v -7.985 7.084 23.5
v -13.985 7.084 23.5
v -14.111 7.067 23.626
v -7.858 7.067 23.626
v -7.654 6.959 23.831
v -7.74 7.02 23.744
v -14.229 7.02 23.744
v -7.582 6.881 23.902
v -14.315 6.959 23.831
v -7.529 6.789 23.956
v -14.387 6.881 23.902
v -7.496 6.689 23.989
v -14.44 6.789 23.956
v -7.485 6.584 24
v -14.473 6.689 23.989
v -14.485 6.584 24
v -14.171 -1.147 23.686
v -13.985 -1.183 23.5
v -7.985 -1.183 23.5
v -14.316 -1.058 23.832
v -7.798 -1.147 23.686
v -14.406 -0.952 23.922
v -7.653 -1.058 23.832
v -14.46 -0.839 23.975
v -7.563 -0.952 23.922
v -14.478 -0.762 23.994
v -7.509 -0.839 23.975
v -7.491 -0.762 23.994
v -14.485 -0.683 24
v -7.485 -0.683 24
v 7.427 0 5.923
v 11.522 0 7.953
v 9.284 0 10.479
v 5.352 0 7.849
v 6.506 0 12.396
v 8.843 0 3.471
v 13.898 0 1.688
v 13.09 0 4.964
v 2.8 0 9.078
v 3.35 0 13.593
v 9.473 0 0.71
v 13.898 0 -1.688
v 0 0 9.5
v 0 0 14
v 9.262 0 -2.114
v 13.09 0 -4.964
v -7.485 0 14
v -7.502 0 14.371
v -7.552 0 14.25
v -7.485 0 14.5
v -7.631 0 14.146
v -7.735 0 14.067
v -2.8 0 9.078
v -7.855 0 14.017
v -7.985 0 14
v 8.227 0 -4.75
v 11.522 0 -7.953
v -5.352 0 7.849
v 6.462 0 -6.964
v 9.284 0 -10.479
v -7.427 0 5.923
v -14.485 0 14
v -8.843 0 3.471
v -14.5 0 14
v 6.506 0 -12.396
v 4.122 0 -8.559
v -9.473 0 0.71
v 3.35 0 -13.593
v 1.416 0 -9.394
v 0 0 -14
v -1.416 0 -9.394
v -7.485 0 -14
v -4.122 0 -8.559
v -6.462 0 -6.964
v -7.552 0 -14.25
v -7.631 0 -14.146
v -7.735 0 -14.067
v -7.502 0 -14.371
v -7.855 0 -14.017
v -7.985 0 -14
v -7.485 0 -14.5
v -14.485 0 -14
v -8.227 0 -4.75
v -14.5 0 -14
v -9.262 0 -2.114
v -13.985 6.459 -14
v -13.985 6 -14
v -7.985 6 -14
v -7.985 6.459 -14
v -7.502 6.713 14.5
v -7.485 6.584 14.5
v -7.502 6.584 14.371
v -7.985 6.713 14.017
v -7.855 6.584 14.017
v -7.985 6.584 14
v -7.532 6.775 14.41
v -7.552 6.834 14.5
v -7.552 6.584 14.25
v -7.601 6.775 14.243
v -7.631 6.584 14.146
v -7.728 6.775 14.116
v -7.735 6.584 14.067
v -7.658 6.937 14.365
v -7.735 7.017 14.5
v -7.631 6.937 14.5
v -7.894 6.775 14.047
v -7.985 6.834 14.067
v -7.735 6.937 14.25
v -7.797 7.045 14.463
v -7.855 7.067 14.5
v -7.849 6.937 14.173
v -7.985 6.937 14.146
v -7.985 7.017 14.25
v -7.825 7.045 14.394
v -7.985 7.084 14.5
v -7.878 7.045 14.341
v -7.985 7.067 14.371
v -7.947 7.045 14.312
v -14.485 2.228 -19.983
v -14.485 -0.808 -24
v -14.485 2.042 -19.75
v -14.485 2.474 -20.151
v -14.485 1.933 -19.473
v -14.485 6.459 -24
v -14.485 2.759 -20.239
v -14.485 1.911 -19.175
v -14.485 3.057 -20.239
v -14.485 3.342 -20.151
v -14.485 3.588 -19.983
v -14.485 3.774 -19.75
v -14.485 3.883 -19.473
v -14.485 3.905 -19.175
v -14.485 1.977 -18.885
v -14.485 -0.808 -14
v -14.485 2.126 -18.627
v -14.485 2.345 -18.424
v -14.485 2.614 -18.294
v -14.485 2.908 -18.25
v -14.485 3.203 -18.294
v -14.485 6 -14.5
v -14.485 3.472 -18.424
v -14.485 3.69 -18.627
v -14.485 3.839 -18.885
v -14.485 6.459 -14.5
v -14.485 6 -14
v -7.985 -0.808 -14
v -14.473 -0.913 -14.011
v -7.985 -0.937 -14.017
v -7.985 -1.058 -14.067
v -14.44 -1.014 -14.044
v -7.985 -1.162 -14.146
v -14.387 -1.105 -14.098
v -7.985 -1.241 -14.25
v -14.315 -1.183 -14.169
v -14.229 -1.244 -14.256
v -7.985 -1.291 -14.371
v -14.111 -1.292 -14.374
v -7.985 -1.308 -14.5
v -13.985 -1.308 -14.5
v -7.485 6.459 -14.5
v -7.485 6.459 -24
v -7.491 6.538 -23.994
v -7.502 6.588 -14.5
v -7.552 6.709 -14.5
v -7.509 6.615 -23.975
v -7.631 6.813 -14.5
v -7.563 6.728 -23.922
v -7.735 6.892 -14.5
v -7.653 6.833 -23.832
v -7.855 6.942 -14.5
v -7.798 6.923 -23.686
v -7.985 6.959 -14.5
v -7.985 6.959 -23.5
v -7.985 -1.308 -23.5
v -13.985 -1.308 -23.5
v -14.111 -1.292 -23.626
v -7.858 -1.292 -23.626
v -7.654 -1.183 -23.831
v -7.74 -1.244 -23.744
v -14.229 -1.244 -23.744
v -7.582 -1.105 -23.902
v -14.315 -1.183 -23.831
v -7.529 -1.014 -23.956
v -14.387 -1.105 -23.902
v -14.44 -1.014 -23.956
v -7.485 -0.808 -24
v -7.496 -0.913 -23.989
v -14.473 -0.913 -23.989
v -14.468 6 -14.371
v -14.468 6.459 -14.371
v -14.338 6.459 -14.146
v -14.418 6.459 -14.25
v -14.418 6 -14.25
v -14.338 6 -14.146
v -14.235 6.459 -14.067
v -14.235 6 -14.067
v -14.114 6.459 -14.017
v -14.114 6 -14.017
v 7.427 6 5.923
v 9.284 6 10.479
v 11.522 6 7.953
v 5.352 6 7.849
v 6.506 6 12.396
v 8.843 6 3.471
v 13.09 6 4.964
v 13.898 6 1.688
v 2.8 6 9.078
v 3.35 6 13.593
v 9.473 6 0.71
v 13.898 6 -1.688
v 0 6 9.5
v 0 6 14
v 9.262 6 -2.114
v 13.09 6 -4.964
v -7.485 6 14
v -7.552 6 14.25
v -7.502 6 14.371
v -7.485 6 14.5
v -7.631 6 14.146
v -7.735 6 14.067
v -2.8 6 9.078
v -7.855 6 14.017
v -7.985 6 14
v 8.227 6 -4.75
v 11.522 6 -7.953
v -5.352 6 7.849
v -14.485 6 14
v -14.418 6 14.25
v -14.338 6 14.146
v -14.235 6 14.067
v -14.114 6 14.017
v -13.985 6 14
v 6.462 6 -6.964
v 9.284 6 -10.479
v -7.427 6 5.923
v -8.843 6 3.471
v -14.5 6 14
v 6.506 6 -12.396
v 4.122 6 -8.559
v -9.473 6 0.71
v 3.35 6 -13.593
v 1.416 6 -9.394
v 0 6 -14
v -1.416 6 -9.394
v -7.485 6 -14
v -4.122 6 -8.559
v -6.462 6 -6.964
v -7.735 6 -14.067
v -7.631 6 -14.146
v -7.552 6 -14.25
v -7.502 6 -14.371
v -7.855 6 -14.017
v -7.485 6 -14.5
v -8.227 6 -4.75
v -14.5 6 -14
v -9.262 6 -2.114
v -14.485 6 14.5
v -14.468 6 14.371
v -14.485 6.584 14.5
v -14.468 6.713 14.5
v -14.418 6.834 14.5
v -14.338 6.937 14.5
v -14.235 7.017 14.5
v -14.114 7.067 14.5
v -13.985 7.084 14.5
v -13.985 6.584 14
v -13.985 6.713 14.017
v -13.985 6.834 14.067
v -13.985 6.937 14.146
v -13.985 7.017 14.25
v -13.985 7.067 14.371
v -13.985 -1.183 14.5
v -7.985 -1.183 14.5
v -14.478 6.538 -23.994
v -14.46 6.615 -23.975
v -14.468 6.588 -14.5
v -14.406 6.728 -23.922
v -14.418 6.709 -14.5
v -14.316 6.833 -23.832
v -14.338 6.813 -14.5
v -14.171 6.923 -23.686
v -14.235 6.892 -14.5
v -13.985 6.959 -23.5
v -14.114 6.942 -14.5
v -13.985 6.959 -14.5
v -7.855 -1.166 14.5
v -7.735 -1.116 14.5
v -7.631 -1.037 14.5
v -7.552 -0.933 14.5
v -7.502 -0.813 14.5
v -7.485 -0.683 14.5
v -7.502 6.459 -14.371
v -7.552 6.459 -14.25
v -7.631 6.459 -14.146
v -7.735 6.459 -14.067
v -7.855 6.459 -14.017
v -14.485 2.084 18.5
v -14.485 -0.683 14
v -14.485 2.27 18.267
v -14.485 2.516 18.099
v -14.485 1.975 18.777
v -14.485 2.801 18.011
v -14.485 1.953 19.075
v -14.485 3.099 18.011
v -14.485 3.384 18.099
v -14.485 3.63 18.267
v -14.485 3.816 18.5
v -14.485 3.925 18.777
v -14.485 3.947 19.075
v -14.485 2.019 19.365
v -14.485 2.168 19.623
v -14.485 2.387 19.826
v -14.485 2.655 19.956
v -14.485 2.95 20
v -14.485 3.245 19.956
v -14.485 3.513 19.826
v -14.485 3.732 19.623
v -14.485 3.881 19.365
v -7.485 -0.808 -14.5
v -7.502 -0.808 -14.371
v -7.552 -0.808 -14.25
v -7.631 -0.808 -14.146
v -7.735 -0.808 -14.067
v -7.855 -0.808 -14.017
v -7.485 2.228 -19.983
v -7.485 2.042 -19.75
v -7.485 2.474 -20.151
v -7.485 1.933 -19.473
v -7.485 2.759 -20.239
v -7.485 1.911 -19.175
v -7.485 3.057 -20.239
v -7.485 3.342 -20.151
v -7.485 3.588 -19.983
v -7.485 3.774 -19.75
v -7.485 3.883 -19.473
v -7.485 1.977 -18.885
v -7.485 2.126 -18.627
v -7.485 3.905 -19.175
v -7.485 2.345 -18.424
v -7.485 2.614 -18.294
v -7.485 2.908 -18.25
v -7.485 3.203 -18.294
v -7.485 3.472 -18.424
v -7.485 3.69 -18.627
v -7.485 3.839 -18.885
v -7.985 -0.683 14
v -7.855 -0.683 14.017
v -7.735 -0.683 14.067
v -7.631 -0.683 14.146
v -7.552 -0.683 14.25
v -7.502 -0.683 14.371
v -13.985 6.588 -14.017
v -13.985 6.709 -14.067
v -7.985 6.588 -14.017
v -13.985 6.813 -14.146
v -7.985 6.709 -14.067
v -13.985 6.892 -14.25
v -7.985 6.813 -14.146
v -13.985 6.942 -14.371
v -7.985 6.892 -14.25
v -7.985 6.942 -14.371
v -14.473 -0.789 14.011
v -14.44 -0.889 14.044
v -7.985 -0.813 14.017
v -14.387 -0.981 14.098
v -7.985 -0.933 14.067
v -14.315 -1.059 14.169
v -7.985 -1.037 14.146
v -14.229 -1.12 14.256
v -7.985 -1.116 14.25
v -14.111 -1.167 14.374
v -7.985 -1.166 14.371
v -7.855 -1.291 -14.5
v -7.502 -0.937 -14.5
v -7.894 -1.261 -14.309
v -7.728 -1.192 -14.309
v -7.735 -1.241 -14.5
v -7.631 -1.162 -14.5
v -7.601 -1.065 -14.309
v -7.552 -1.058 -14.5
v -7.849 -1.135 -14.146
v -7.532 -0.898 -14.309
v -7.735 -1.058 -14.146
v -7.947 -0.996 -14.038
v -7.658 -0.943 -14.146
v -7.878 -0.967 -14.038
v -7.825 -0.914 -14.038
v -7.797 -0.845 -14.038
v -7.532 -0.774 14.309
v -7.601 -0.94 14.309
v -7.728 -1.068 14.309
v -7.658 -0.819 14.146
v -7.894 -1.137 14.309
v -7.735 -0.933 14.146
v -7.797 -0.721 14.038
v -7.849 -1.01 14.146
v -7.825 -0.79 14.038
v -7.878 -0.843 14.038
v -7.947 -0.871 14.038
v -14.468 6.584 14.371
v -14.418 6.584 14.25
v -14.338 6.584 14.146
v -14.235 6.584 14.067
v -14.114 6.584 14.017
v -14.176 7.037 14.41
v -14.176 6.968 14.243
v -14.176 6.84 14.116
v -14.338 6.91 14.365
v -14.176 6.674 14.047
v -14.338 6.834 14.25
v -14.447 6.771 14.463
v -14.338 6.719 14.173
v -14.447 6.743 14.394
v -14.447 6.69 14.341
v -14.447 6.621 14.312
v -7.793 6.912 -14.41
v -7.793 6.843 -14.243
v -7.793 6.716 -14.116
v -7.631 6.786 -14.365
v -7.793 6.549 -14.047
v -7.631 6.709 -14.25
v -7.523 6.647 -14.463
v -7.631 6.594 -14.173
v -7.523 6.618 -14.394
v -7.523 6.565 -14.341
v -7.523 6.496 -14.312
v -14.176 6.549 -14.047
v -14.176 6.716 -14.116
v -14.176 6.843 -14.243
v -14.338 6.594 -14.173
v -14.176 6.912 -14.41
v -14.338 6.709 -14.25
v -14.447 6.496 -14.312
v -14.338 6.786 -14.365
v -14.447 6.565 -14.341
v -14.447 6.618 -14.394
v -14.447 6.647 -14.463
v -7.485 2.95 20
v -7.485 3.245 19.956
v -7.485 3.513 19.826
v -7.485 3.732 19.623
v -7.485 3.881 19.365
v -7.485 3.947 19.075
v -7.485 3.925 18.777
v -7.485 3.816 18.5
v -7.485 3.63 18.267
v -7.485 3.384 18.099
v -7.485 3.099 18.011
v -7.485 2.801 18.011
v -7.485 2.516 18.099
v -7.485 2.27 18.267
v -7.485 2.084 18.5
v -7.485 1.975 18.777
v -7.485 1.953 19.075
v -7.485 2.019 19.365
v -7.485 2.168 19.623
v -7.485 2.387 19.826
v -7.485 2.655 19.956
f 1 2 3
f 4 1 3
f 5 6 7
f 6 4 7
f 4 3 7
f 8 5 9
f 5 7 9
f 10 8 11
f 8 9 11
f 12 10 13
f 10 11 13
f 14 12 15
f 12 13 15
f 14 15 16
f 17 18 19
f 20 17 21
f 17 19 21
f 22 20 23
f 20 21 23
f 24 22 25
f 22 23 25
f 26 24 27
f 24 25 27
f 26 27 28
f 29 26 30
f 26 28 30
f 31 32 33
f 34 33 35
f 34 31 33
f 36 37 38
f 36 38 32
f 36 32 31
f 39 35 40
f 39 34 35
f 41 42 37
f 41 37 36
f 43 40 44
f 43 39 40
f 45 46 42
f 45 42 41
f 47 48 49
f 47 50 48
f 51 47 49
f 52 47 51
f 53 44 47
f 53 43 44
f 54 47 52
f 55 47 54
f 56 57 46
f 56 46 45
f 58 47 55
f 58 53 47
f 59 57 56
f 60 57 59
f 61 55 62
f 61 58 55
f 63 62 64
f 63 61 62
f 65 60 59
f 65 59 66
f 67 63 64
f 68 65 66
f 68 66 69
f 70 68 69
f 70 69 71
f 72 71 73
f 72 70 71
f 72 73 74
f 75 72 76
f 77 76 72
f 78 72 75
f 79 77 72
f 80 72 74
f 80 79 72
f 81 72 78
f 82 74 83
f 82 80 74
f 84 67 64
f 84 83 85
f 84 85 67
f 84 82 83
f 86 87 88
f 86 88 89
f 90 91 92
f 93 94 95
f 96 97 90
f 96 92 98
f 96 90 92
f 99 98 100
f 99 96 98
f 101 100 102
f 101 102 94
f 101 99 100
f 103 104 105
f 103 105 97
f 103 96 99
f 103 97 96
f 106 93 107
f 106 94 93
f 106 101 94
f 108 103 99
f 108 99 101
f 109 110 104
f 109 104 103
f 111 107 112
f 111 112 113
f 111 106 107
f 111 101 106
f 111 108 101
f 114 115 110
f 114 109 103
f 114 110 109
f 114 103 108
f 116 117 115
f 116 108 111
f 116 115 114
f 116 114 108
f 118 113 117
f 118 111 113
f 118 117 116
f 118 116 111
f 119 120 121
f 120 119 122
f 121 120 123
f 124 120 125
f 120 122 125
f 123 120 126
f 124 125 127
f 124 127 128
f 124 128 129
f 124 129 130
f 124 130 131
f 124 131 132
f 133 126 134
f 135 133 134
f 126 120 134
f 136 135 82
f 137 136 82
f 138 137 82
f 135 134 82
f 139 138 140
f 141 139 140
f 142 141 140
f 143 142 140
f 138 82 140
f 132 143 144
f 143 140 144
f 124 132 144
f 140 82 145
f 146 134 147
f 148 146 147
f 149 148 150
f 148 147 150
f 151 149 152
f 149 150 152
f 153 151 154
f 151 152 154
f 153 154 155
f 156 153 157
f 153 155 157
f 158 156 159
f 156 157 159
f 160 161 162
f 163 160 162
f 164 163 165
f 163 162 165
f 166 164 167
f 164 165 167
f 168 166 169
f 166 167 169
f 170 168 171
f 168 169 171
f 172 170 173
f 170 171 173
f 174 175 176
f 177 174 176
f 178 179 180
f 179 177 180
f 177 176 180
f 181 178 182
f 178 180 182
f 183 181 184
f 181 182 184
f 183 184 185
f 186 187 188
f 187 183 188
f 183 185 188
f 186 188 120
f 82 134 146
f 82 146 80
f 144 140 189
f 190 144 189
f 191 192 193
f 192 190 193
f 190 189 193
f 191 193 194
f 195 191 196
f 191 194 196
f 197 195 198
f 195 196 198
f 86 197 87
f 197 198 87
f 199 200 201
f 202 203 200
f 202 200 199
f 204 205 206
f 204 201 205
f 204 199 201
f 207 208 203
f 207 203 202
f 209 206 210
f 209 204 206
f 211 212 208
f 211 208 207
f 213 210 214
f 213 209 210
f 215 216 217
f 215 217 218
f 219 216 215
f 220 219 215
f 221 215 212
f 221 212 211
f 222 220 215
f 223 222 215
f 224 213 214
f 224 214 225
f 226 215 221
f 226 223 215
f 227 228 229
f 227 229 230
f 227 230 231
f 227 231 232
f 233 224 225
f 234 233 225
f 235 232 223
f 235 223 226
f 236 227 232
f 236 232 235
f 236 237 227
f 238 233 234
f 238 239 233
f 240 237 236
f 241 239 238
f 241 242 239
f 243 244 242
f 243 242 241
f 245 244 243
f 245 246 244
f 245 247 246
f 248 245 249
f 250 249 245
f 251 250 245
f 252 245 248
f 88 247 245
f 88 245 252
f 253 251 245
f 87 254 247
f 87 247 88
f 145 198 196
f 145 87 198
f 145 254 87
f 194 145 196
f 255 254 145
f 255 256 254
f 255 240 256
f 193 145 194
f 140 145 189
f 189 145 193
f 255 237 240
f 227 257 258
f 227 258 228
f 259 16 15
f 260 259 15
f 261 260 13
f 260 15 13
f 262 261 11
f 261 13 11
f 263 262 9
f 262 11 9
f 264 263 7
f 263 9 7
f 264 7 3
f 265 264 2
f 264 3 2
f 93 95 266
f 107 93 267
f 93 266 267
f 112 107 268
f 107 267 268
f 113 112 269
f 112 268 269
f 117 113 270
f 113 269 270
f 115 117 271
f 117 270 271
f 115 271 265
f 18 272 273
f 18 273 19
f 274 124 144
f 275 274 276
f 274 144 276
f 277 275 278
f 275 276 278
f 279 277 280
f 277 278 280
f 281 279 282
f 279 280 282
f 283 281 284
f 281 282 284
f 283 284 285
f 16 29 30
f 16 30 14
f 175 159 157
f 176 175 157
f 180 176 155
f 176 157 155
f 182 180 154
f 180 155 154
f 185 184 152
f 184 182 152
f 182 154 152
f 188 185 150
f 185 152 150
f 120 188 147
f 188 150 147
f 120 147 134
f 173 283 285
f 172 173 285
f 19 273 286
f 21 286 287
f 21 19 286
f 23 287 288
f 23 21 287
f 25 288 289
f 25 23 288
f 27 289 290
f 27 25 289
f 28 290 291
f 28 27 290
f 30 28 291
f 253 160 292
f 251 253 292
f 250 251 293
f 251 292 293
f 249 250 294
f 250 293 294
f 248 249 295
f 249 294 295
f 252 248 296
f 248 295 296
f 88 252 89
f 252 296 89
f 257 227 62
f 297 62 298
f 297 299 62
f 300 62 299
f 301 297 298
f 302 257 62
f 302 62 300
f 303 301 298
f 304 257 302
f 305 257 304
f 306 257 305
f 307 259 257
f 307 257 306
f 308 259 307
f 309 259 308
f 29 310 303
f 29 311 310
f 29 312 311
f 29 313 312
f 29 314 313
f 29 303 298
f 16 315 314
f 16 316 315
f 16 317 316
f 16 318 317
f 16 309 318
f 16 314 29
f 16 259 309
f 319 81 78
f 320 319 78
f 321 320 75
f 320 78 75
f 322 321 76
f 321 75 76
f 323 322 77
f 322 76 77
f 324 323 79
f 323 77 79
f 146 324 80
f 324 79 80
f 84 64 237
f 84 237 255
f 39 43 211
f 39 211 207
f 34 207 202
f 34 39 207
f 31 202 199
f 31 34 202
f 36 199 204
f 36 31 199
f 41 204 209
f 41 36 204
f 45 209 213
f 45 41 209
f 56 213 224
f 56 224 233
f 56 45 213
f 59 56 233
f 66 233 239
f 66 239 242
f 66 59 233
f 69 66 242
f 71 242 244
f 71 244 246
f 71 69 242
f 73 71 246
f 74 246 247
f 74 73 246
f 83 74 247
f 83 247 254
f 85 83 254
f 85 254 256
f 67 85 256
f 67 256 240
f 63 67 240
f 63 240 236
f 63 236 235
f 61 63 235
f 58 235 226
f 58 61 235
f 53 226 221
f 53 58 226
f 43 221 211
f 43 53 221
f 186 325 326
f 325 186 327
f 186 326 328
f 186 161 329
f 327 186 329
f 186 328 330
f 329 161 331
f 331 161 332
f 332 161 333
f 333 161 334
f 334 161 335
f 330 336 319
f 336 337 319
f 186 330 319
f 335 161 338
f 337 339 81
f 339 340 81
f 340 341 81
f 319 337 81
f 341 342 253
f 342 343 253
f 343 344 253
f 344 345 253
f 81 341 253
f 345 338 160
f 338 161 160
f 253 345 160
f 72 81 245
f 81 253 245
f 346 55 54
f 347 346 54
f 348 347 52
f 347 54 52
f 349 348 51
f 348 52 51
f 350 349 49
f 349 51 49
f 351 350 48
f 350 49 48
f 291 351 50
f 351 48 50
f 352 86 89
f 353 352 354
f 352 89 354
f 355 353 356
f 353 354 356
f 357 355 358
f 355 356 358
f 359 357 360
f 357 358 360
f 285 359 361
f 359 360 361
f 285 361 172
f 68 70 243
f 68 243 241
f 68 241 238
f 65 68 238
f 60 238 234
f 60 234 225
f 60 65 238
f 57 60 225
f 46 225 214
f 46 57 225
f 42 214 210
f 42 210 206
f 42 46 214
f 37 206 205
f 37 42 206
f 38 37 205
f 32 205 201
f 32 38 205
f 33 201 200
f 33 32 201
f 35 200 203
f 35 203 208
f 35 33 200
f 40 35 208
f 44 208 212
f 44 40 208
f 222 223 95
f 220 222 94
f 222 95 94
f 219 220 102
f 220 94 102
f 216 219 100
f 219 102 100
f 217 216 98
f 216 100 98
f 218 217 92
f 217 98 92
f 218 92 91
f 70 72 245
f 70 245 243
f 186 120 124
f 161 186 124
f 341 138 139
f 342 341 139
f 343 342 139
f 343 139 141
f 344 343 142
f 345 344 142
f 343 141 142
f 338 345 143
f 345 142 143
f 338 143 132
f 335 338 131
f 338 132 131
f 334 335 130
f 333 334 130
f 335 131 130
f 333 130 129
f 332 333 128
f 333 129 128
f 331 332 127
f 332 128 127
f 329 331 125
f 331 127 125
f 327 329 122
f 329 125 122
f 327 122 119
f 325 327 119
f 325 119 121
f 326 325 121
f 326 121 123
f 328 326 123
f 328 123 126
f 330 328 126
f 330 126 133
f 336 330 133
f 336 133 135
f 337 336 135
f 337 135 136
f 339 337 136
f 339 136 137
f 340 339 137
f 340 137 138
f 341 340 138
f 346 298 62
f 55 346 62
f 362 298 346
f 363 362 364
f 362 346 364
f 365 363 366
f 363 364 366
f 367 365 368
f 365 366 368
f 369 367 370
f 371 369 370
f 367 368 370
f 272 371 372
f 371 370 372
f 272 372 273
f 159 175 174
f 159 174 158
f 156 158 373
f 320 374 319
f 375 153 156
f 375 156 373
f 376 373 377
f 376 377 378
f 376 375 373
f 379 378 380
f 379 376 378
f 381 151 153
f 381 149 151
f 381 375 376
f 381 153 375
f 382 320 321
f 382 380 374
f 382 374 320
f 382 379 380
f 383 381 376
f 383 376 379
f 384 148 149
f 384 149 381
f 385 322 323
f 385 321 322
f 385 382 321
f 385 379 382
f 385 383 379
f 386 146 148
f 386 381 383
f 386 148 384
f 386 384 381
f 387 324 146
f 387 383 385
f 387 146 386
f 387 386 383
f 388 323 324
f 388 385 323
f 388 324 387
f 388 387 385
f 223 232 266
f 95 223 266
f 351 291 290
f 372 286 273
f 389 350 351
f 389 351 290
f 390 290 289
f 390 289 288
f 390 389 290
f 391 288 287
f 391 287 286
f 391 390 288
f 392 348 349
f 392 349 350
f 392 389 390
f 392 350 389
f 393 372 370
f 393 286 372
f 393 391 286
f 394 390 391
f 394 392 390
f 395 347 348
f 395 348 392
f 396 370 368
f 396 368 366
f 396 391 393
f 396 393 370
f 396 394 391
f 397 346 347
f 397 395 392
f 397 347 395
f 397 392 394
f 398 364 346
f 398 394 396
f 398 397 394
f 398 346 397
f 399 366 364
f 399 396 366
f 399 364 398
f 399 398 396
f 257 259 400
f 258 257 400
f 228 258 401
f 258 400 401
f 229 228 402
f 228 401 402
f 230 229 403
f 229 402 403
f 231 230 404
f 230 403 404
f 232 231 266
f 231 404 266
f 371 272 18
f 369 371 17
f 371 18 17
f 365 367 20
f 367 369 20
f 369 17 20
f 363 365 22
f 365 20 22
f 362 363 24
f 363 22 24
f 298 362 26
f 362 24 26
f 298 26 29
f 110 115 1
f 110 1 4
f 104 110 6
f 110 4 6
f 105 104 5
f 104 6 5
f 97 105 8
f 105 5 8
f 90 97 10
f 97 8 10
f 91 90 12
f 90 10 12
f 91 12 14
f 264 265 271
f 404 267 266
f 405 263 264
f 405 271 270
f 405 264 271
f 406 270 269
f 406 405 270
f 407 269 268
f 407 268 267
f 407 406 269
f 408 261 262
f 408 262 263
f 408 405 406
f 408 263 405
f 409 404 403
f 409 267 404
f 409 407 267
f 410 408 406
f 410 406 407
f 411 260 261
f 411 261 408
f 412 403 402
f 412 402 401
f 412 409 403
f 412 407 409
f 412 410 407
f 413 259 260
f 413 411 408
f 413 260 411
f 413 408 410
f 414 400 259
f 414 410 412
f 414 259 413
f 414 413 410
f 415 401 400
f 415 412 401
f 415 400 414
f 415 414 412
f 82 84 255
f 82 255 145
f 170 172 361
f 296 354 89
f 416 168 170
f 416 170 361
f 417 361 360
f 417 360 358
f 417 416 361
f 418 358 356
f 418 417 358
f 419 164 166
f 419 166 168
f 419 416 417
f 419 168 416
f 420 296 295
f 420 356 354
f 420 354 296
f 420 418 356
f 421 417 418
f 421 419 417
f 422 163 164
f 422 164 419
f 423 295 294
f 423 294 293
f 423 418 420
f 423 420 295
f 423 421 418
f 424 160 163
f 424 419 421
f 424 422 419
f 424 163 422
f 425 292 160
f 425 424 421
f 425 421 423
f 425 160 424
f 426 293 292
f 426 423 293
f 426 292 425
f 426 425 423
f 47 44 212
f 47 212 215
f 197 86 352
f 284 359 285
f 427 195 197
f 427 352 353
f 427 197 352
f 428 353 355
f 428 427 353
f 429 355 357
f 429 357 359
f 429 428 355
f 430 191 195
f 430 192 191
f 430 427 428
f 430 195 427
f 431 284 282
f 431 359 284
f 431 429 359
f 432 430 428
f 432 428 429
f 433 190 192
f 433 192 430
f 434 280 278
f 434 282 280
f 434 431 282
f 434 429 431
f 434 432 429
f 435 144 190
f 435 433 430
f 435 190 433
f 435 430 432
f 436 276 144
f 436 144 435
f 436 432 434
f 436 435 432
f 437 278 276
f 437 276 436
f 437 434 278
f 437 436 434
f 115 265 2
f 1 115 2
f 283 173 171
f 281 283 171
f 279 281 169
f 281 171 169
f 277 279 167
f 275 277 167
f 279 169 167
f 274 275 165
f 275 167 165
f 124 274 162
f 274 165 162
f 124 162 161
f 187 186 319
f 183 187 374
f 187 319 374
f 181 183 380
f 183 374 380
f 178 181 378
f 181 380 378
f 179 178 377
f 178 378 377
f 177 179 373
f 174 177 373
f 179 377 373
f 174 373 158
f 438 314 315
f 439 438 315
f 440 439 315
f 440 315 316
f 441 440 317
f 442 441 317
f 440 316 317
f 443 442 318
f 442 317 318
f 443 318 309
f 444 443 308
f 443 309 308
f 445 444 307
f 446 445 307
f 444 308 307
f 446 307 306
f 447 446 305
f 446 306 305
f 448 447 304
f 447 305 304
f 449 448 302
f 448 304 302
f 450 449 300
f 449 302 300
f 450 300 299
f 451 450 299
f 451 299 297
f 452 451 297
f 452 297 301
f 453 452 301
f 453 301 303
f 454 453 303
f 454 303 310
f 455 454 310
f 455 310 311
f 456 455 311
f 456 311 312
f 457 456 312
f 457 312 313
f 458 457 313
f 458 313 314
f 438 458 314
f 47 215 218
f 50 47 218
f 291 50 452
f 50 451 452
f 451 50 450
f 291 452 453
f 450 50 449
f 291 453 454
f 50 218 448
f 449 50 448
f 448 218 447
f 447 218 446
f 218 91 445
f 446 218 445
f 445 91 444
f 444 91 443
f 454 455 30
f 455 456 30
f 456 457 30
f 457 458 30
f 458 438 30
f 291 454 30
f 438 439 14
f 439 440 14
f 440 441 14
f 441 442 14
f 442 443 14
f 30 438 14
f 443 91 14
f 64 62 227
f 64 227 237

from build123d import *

# Parameters (mm, degrees)
SKETCH1_R           = 9.5
BOSS_EXTRUDE1_DEPTH = 6
SKETCH4_W           = 6.667748921
SKETCH4_H           = 8.267013878
BOSS_EXTRUDE2_DEPTH = 10
SKETCH6_W           = 10
SKETCH6_H           = 8.267013878
BOSS_EXTRUDE3_DEPTH = 7
FILLET7_R           = 0.5
FILLET9_R           = 0.5
FILLET10_R          = 0.5
FILLET12_R          = 0.5
FILLET13_R          = 0.5
SKETCH7_R           = 1
CUT_EXTRUDE1_DEPTH  = 8
SKETCH8_R           = 1
CUT_EXTRUDE2_DEPTH  = 8


with BuildPart() as part:
    # Sketch1 → Boss-Extrude1 (new body)
    with BuildSketch(Plane(origin=(0, 0, 0), x_dir=(1, 0, 0), z_dir=(0, 1, 0))):
        with BuildLine():
            Line((0, -14), (-14.5, -14))
            Line((-14.5, -14), (-14.5, 14))
            Line((-14.5, 14), (0, 14))
            ThreePointArc((0, 14), (14, 0), (0, -14))
        make_face()
        with Locations(Location((0, 0, 0), (0, 0, 270))):
            Circle(SKETCH1_R, mode=Mode.SUBTRACT)
    extrude(amount=BOSS_EXTRUDE1_DEPTH)

    # Sketch4 → Boss-Extrude2 (add)
    with BuildSketch(Plane(origin=(0, 0, -14), x_dir=(-1, 0, 0), z_dir=(0, 0, -1))):
        with Locations((11.150715383, 2.825461015)):
            Rectangle(SKETCH4_W, SKETCH4_H)
    extrude(amount=BOSS_EXTRUDE2_DEPTH)

    # Sketch6 → Boss-Extrude3 (add)
    with BuildSketch(Plane.ZY.offset(14.484589844)):
        with Locations((-19, 2.825461015)):
            Rectangle(SKETCH6_W, SKETCH6_H)
        with Locations((19, 2.950047349)):
            Rectangle(SKETCH6_W, SKETCH6_H)
    extrude(amount=-BOSS_EXTRUDE3_DEPTH)

    # Fillet7
    fillet7_edges = [part.edges().sort_by_distance(p)[0] for p in [
        (-10.984589844, -1.18345959, 14),
        (-7.484589844, -1.18345959, 19),
        (-10.984589844, -1.18345959, 24),
        (-14.484589844, -1.18345959, 19),
    ]]
    fillet(fillet7_edges, radius=FILLET7_R)

    # Fillet9
    # the kernel refuses this fillet: 0.5 mm, written as the material it takes off along each edge
    with BuildSketch(Plane(origin=(-7.984589844, -0.68345959, 14.5), x_dir=(1, 0, 0), z_dir=(0, 0, -1))) as fillet9_piece_1_section:
        Polygon((0, 0), (FILLET9_R * 1.02, 0), (FILLET9_R * 1.02, FILLET9_R * 1.02), (0, FILLET9_R * 1.02), align=None)
    fillet9_piece_1 = extrude(amount=FILLET9_R * 1.02, mode=Mode.PRIVATE)
    fillet9_piece_1 = fillet9_piece_1 - Plane(origin=(-7.984589844, -0.68345959, 14.5), x_dir=(-0.7071067811865475, 0.7071067811865475, 0), z_dir=(0, 0, -1)) * Sphere(FILLET9_R, mode=Mode.PRIVATE)
    add(fillet9_piece_1, mode=Mode.SUBTRACT)
    with BuildSketch(Plane(origin=(-7.484589844, 0, 14), x_dir=(-1, 0, 0), z_dir=(0, -1, 0))) as fillet9_piece_2:
        with BuildLine():
            CenterArc((FILLET9_R, -FILLET9_R), FILLET9_R, 90, 90)
            Line((0, -FILLET9_R), (0, 0))
            Line((0, 0), (FILLET9_R, 0))
        make_face()
    extrude(amount=0.68345959, mode=Mode.SUBTRACT)
    with BuildSketch(Plane(origin=(-15.734589844, 7.083554288, 14), x_dir=(0, -1, 0), z_dir=(1, 0, 0))) as fillet9_piece_3:
        with BuildLine():
            CenterArc((FILLET9_R, -FILLET9_R), FILLET9_R, 90, 90)
            Line((0, -FILLET9_R), (0, 0))
            Line((0, 0), (FILLET9_R, 0))
        make_face()
    extrude(amount=9.5, mode=Mode.SUBTRACT)
    with BuildSketch(Plane(origin=(-7.484589844, 8.333554288, 14), x_dir=(-1, 0, 0), z_dir=(0, -1, 0)), Plane(origin=(-14.484589844, 8.333554288, 14), x_dir=(0, 0, 1), z_dir=(0, -1, 0))) as fillet9_piece_4:
        with BuildLine():
            CenterArc((FILLET9_R, -FILLET9_R), FILLET9_R, 90, 90)
            Line((0, -FILLET9_R), (0, 0))
            Line((0, 0), (FILLET9_R, 0))
        make_face()
    extrude(amount=2.333554288, mode=Mode.SUBTRACT)

    # Fillet10
    # the kernel refuses this fillet: 0.5 mm, written as the material it takes off along each edge
    with BuildSketch(Plane(origin=(-13.984589844, 6.583554288, 14.5), x_dir=(0, 1, 0), z_dir=(-1, 0, 0))) as fillet10_piece_1_section:
        Polygon((0, 0), (FILLET10_R, 0), (FILLET10_R, FILLET10_R), (0, FILLET10_R), align=None)
    fillet10_piece_1 = extrude(amount=FILLET10_R, mode=Mode.PRIVATE)
    fillet10_piece_1 = fillet10_piece_1 - Plane(origin=(-13.984589844, 6.583554288, 14.5), x_dir=(0, -0.7071067811865475, 0.7071067811865475), z_dir=(-1, 0, 0)) * Sphere(FILLET10_R, mode=Mode.PRIVATE)
    add(fillet10_piece_1, mode=Mode.SUBTRACT)
    with BuildSketch(Plane(origin=(-7.984589844, 6.583554288, 14.5), x_dir=(1, 0, 0), z_dir=(0, 1, 0))) as fillet10_piece_2_section:
        Polygon((0, 0), (FILLET10_R, 0), (FILLET10_R, FILLET10_R), (0, FILLET10_R), align=None)
    fillet10_piece_2 = extrude(amount=FILLET10_R, mode=Mode.PRIVATE)
    fillet10_piece_2 = fillet10_piece_2 - Plane(origin=(-7.984589844, 6.583554288, 14.5), x_dir=(-0.7071067811865475, 0, 0.7071067811865475), z_dir=(0, 1, 0)) * Sphere(FILLET10_R, mode=Mode.PRIVATE)
    add(fillet10_piece_2, mode=Mode.SUBTRACT)
    with BuildSketch(Plane(origin=(-14.484589844, -1.308045924, -12.75), x_dir=(0, 1, 0), z_dir=(0, 0, -1))) as fillet10_piece_3:
        with BuildLine():
            CenterArc((FILLET10_R, FILLET10_R), FILLET10_R, 180, 90)
            Line((0, FILLET10_R), (0, 0))
            Line((0, 0), (FILLET10_R, 0))
        make_face()
    extrude(amount=12.5, mode=Mode.SUBTRACT)
    with BuildSketch(Plane(origin=(-15.734589844, -1.308045924, -14), x_dir=(0, 1, 0), z_dir=(1, 0, 0)), Plane(origin=(-15.734589844, -1.308045924, -24), x_dir=(0, 0, 1), z_dir=(1, 0, 0)), Plane(origin=(-15.734589844, 7.083554288, 24), x_dir=(0, 0, -1), z_dir=(1, 0, 0))) as fillet10_piece_4:
        with BuildLine():
            CenterArc((FILLET10_R, -FILLET10_R), FILLET10_R, 90, 90)
            Line((0, -FILLET10_R), (0, 0))
            Line((0, 0), (FILLET10_R, 0))
        make_face()
    extrude(amount=9.5, mode=Mode.SUBTRACT)
    with BuildSketch(Plane(origin=(-7.484589844, -1.308045924, -12.75), x_dir=(0, 1, 0), z_dir=(0, 0, -1))) as fillet10_piece_5:
        with BuildLine():
            CenterArc((FILLET10_R, -FILLET10_R), FILLET10_R, 90, 90)
            Line((0, -FILLET10_R), (0, 0))
            Line((0, 0), (FILLET10_R, 0))
        make_face()
    extrude(amount=12.5, mode=Mode.SUBTRACT)
    with BuildSketch(Plane(origin=(-7.484589844, 7.083554288, 25.25), x_dir=(-1, 0, 0), z_dir=(0, 0, -1)), Plane(origin=(-14.484589844, 7.083554288, 25.25), x_dir=(0, -1, 0), z_dir=(0, 0, -1))) as fillet10_piece_6:
        with BuildLine():
            CenterArc((FILLET10_R, -FILLET10_R), FILLET10_R, 90, 90)
            Line((0, -FILLET10_R), (0, 0))
            Line((0, 0), (FILLET10_R, 0))
        make_face()
    extrude(amount=10.75, mode=Mode.SUBTRACT)

    # Fillet12
    # the kernel refuses this fillet: 0.5 mm, written as the material it takes off along each edge
    with BuildSketch(Plane(origin=(-7.984589844, -0.808045924, -14.5), x_dir=(1, 0, 0), z_dir=(0, 0, 1))) as fillet12_piece_1_section:
        Polygon((0, 0), (FILLET12_R * 1.02, 0), (FILLET12_R * 1.02, -FILLET12_R * 1.02), (0, -FILLET12_R * 1.02), align=None)
    fillet12_piece_1 = extrude(amount=FILLET12_R * 1.02, mode=Mode.PRIVATE)
    fillet12_piece_1 = fillet12_piece_1 - Plane(origin=(-7.984589844, -0.808045924, -14.5), x_dir=(-0.7071067811865475, 0.7071067811865476, 0), z_dir=(0, 0, 1)) * Sphere(FILLET12_R, mode=Mode.PRIVATE)
    add(fillet12_piece_1, mode=Mode.SUBTRACT)
    with BuildSketch(Plane(origin=(-7.484589844, 0, -14), x_dir=(-1, 0, 0), z_dir=(0, -1, 0))) as fillet12_piece_2:
        with BuildLine():
            CenterArc((FILLET12_R, FILLET12_R), FILLET12_R, 180, 90)
            Line((0, FILLET12_R), (0, 0))
            Line((0, 0), (FILLET12_R, 0))
        make_face()
    extrude(amount=0.808045924, mode=Mode.SUBTRACT)
    with BuildSketch(Plane(origin=(-14.484589844, 6, -14), x_dir=(1, 0, 0), z_dir=(0, 1, 0)), Plane(origin=(-7.484589844, 8.208967954, -14), x_dir=(-1, 0, 0), z_dir=(0, -1, 0))) as fillet12_piece_3:
        with BuildLine():
            CenterArc((FILLET12_R, FILLET12_R), FILLET12_R, 180, 90)
            Line((0, FILLET12_R), (0, 0))
            Line((0, 0), (FILLET12_R, 0))
        make_face()
    extrude(amount=2.208967954, mode=Mode.SUBTRACT)
    with BuildSketch(Plane(origin=(-6.234589844, 6.958967954, -14), x_dir=(0, -1, 0), z_dir=(-1, 0, 0))) as fillet12_piece_4:
        with BuildLine():
            CenterArc((FILLET12_R, -FILLET12_R), FILLET12_R, 90, 90)
            Line((0, -FILLET12_R), (0, 0))
            Line((0, 0), (FILLET12_R, 0))
        make_face()
    extrude(amount=9.5, mode=Mode.SUBTRACT)

    # Fillet13
    # the kernel refuses this fillet: 0.5 mm, written as the material it takes off along each edge
    with BuildSketch(Plane(origin=(-13.984589844, 6.458967954, -14.5), x_dir=(0, 1, 0), z_dir=(-1, 0, 0))) as fillet13_piece_1_section:
        Polygon((0, 0), (FILLET13_R, 0), (FILLET13_R, -FILLET13_R), (0, -FILLET13_R), align=None)
    fillet13_piece_1 = extrude(amount=FILLET13_R, mode=Mode.PRIVATE)
    fillet13_piece_1 = fillet13_piece_1 - Plane(origin=(-13.984589844, 6.458967954, -14.5), x_dir=(0, -0.7071067811865475, -0.7071067811865475), z_dir=(-1, 0, 0)) * Sphere(FILLET13_R, mode=Mode.PRIVATE)
    add(fillet13_piece_1, mode=Mode.SUBTRACT)
    with BuildSketch(Plane(origin=(-7.984589844, 6.458967954, -14.5), x_dir=(0, 1, 0), z_dir=(1, 0, 0))) as fillet13_piece_2_section:
        Polygon((0, 0), (FILLET13_R, 0), (FILLET13_R, FILLET13_R), (0, FILLET13_R), align=None)
    fillet13_piece_2 = extrude(amount=FILLET13_R, mode=Mode.PRIVATE)
    fillet13_piece_2 = fillet13_piece_2 - Plane(origin=(-7.984589844, 6.458967954, -14.5), x_dir=(0, -0.7071067811865475, -0.7071067811865475), z_dir=(1, 0, 0)) * Sphere(FILLET13_R, mode=Mode.PRIVATE)
    add(fillet13_piece_2, mode=Mode.SUBTRACT)
    with BuildSketch(Plane(origin=(-7.484589844, 6.958967954, -25.25), x_dir=(0, -1, 0), z_dir=(0, 0, 1)), Plane(origin=(-14.484589844, 6.958967954, -14.5), x_dir=(0, -1, 0), z_dir=(0, 0, -1))) as fillet13_piece_3:
        with BuildLine():
            CenterArc((FILLET13_R, -FILLET13_R), FILLET13_R, 90, 90)
            Line((0, -FILLET13_R), (0, 0))
            Line((0, 0), (FILLET13_R, 0))
        make_face()
    extrude(amount=10.75, mode=Mode.SUBTRACT)
    with BuildSketch(Plane(origin=(-6.234589844, 6.958967954, -24), x_dir=(0, 0, 1), z_dir=(-1, 0, 0))) as fillet13_piece_4:
        with BuildLine():
            CenterArc((FILLET13_R, -FILLET13_R), FILLET13_R, 90, 90)
            Line((0, -FILLET13_R), (0, 0))
            Line((0, 0), (FILLET13_R, 0))
        make_face()
    extrude(amount=9.5, mode=Mode.SUBTRACT)

    # Sketch7 → Cut-Extrude1 (cut)
    with BuildSketch(Plane.ZY.offset(14.484589844)):
        with Locations((-19.25, 2.908270205)):
            Circle(SKETCH7_R)
    extrude(amount=-CUT_EXTRUDE1_DEPTH, mode=Mode.SUBTRACT)

    # Sketch8 → Cut-Extrude2 (cut)
    with BuildSketch(Plane.ZY.offset(14.484589844)):
        with Locations((19, 2.950047349)):
            Circle(SKETCH8_R)
    extrude(amount=-CUT_EXTRUDE2_DEPTH, mode=Mode.SUBTRACT)


solid = part.part
